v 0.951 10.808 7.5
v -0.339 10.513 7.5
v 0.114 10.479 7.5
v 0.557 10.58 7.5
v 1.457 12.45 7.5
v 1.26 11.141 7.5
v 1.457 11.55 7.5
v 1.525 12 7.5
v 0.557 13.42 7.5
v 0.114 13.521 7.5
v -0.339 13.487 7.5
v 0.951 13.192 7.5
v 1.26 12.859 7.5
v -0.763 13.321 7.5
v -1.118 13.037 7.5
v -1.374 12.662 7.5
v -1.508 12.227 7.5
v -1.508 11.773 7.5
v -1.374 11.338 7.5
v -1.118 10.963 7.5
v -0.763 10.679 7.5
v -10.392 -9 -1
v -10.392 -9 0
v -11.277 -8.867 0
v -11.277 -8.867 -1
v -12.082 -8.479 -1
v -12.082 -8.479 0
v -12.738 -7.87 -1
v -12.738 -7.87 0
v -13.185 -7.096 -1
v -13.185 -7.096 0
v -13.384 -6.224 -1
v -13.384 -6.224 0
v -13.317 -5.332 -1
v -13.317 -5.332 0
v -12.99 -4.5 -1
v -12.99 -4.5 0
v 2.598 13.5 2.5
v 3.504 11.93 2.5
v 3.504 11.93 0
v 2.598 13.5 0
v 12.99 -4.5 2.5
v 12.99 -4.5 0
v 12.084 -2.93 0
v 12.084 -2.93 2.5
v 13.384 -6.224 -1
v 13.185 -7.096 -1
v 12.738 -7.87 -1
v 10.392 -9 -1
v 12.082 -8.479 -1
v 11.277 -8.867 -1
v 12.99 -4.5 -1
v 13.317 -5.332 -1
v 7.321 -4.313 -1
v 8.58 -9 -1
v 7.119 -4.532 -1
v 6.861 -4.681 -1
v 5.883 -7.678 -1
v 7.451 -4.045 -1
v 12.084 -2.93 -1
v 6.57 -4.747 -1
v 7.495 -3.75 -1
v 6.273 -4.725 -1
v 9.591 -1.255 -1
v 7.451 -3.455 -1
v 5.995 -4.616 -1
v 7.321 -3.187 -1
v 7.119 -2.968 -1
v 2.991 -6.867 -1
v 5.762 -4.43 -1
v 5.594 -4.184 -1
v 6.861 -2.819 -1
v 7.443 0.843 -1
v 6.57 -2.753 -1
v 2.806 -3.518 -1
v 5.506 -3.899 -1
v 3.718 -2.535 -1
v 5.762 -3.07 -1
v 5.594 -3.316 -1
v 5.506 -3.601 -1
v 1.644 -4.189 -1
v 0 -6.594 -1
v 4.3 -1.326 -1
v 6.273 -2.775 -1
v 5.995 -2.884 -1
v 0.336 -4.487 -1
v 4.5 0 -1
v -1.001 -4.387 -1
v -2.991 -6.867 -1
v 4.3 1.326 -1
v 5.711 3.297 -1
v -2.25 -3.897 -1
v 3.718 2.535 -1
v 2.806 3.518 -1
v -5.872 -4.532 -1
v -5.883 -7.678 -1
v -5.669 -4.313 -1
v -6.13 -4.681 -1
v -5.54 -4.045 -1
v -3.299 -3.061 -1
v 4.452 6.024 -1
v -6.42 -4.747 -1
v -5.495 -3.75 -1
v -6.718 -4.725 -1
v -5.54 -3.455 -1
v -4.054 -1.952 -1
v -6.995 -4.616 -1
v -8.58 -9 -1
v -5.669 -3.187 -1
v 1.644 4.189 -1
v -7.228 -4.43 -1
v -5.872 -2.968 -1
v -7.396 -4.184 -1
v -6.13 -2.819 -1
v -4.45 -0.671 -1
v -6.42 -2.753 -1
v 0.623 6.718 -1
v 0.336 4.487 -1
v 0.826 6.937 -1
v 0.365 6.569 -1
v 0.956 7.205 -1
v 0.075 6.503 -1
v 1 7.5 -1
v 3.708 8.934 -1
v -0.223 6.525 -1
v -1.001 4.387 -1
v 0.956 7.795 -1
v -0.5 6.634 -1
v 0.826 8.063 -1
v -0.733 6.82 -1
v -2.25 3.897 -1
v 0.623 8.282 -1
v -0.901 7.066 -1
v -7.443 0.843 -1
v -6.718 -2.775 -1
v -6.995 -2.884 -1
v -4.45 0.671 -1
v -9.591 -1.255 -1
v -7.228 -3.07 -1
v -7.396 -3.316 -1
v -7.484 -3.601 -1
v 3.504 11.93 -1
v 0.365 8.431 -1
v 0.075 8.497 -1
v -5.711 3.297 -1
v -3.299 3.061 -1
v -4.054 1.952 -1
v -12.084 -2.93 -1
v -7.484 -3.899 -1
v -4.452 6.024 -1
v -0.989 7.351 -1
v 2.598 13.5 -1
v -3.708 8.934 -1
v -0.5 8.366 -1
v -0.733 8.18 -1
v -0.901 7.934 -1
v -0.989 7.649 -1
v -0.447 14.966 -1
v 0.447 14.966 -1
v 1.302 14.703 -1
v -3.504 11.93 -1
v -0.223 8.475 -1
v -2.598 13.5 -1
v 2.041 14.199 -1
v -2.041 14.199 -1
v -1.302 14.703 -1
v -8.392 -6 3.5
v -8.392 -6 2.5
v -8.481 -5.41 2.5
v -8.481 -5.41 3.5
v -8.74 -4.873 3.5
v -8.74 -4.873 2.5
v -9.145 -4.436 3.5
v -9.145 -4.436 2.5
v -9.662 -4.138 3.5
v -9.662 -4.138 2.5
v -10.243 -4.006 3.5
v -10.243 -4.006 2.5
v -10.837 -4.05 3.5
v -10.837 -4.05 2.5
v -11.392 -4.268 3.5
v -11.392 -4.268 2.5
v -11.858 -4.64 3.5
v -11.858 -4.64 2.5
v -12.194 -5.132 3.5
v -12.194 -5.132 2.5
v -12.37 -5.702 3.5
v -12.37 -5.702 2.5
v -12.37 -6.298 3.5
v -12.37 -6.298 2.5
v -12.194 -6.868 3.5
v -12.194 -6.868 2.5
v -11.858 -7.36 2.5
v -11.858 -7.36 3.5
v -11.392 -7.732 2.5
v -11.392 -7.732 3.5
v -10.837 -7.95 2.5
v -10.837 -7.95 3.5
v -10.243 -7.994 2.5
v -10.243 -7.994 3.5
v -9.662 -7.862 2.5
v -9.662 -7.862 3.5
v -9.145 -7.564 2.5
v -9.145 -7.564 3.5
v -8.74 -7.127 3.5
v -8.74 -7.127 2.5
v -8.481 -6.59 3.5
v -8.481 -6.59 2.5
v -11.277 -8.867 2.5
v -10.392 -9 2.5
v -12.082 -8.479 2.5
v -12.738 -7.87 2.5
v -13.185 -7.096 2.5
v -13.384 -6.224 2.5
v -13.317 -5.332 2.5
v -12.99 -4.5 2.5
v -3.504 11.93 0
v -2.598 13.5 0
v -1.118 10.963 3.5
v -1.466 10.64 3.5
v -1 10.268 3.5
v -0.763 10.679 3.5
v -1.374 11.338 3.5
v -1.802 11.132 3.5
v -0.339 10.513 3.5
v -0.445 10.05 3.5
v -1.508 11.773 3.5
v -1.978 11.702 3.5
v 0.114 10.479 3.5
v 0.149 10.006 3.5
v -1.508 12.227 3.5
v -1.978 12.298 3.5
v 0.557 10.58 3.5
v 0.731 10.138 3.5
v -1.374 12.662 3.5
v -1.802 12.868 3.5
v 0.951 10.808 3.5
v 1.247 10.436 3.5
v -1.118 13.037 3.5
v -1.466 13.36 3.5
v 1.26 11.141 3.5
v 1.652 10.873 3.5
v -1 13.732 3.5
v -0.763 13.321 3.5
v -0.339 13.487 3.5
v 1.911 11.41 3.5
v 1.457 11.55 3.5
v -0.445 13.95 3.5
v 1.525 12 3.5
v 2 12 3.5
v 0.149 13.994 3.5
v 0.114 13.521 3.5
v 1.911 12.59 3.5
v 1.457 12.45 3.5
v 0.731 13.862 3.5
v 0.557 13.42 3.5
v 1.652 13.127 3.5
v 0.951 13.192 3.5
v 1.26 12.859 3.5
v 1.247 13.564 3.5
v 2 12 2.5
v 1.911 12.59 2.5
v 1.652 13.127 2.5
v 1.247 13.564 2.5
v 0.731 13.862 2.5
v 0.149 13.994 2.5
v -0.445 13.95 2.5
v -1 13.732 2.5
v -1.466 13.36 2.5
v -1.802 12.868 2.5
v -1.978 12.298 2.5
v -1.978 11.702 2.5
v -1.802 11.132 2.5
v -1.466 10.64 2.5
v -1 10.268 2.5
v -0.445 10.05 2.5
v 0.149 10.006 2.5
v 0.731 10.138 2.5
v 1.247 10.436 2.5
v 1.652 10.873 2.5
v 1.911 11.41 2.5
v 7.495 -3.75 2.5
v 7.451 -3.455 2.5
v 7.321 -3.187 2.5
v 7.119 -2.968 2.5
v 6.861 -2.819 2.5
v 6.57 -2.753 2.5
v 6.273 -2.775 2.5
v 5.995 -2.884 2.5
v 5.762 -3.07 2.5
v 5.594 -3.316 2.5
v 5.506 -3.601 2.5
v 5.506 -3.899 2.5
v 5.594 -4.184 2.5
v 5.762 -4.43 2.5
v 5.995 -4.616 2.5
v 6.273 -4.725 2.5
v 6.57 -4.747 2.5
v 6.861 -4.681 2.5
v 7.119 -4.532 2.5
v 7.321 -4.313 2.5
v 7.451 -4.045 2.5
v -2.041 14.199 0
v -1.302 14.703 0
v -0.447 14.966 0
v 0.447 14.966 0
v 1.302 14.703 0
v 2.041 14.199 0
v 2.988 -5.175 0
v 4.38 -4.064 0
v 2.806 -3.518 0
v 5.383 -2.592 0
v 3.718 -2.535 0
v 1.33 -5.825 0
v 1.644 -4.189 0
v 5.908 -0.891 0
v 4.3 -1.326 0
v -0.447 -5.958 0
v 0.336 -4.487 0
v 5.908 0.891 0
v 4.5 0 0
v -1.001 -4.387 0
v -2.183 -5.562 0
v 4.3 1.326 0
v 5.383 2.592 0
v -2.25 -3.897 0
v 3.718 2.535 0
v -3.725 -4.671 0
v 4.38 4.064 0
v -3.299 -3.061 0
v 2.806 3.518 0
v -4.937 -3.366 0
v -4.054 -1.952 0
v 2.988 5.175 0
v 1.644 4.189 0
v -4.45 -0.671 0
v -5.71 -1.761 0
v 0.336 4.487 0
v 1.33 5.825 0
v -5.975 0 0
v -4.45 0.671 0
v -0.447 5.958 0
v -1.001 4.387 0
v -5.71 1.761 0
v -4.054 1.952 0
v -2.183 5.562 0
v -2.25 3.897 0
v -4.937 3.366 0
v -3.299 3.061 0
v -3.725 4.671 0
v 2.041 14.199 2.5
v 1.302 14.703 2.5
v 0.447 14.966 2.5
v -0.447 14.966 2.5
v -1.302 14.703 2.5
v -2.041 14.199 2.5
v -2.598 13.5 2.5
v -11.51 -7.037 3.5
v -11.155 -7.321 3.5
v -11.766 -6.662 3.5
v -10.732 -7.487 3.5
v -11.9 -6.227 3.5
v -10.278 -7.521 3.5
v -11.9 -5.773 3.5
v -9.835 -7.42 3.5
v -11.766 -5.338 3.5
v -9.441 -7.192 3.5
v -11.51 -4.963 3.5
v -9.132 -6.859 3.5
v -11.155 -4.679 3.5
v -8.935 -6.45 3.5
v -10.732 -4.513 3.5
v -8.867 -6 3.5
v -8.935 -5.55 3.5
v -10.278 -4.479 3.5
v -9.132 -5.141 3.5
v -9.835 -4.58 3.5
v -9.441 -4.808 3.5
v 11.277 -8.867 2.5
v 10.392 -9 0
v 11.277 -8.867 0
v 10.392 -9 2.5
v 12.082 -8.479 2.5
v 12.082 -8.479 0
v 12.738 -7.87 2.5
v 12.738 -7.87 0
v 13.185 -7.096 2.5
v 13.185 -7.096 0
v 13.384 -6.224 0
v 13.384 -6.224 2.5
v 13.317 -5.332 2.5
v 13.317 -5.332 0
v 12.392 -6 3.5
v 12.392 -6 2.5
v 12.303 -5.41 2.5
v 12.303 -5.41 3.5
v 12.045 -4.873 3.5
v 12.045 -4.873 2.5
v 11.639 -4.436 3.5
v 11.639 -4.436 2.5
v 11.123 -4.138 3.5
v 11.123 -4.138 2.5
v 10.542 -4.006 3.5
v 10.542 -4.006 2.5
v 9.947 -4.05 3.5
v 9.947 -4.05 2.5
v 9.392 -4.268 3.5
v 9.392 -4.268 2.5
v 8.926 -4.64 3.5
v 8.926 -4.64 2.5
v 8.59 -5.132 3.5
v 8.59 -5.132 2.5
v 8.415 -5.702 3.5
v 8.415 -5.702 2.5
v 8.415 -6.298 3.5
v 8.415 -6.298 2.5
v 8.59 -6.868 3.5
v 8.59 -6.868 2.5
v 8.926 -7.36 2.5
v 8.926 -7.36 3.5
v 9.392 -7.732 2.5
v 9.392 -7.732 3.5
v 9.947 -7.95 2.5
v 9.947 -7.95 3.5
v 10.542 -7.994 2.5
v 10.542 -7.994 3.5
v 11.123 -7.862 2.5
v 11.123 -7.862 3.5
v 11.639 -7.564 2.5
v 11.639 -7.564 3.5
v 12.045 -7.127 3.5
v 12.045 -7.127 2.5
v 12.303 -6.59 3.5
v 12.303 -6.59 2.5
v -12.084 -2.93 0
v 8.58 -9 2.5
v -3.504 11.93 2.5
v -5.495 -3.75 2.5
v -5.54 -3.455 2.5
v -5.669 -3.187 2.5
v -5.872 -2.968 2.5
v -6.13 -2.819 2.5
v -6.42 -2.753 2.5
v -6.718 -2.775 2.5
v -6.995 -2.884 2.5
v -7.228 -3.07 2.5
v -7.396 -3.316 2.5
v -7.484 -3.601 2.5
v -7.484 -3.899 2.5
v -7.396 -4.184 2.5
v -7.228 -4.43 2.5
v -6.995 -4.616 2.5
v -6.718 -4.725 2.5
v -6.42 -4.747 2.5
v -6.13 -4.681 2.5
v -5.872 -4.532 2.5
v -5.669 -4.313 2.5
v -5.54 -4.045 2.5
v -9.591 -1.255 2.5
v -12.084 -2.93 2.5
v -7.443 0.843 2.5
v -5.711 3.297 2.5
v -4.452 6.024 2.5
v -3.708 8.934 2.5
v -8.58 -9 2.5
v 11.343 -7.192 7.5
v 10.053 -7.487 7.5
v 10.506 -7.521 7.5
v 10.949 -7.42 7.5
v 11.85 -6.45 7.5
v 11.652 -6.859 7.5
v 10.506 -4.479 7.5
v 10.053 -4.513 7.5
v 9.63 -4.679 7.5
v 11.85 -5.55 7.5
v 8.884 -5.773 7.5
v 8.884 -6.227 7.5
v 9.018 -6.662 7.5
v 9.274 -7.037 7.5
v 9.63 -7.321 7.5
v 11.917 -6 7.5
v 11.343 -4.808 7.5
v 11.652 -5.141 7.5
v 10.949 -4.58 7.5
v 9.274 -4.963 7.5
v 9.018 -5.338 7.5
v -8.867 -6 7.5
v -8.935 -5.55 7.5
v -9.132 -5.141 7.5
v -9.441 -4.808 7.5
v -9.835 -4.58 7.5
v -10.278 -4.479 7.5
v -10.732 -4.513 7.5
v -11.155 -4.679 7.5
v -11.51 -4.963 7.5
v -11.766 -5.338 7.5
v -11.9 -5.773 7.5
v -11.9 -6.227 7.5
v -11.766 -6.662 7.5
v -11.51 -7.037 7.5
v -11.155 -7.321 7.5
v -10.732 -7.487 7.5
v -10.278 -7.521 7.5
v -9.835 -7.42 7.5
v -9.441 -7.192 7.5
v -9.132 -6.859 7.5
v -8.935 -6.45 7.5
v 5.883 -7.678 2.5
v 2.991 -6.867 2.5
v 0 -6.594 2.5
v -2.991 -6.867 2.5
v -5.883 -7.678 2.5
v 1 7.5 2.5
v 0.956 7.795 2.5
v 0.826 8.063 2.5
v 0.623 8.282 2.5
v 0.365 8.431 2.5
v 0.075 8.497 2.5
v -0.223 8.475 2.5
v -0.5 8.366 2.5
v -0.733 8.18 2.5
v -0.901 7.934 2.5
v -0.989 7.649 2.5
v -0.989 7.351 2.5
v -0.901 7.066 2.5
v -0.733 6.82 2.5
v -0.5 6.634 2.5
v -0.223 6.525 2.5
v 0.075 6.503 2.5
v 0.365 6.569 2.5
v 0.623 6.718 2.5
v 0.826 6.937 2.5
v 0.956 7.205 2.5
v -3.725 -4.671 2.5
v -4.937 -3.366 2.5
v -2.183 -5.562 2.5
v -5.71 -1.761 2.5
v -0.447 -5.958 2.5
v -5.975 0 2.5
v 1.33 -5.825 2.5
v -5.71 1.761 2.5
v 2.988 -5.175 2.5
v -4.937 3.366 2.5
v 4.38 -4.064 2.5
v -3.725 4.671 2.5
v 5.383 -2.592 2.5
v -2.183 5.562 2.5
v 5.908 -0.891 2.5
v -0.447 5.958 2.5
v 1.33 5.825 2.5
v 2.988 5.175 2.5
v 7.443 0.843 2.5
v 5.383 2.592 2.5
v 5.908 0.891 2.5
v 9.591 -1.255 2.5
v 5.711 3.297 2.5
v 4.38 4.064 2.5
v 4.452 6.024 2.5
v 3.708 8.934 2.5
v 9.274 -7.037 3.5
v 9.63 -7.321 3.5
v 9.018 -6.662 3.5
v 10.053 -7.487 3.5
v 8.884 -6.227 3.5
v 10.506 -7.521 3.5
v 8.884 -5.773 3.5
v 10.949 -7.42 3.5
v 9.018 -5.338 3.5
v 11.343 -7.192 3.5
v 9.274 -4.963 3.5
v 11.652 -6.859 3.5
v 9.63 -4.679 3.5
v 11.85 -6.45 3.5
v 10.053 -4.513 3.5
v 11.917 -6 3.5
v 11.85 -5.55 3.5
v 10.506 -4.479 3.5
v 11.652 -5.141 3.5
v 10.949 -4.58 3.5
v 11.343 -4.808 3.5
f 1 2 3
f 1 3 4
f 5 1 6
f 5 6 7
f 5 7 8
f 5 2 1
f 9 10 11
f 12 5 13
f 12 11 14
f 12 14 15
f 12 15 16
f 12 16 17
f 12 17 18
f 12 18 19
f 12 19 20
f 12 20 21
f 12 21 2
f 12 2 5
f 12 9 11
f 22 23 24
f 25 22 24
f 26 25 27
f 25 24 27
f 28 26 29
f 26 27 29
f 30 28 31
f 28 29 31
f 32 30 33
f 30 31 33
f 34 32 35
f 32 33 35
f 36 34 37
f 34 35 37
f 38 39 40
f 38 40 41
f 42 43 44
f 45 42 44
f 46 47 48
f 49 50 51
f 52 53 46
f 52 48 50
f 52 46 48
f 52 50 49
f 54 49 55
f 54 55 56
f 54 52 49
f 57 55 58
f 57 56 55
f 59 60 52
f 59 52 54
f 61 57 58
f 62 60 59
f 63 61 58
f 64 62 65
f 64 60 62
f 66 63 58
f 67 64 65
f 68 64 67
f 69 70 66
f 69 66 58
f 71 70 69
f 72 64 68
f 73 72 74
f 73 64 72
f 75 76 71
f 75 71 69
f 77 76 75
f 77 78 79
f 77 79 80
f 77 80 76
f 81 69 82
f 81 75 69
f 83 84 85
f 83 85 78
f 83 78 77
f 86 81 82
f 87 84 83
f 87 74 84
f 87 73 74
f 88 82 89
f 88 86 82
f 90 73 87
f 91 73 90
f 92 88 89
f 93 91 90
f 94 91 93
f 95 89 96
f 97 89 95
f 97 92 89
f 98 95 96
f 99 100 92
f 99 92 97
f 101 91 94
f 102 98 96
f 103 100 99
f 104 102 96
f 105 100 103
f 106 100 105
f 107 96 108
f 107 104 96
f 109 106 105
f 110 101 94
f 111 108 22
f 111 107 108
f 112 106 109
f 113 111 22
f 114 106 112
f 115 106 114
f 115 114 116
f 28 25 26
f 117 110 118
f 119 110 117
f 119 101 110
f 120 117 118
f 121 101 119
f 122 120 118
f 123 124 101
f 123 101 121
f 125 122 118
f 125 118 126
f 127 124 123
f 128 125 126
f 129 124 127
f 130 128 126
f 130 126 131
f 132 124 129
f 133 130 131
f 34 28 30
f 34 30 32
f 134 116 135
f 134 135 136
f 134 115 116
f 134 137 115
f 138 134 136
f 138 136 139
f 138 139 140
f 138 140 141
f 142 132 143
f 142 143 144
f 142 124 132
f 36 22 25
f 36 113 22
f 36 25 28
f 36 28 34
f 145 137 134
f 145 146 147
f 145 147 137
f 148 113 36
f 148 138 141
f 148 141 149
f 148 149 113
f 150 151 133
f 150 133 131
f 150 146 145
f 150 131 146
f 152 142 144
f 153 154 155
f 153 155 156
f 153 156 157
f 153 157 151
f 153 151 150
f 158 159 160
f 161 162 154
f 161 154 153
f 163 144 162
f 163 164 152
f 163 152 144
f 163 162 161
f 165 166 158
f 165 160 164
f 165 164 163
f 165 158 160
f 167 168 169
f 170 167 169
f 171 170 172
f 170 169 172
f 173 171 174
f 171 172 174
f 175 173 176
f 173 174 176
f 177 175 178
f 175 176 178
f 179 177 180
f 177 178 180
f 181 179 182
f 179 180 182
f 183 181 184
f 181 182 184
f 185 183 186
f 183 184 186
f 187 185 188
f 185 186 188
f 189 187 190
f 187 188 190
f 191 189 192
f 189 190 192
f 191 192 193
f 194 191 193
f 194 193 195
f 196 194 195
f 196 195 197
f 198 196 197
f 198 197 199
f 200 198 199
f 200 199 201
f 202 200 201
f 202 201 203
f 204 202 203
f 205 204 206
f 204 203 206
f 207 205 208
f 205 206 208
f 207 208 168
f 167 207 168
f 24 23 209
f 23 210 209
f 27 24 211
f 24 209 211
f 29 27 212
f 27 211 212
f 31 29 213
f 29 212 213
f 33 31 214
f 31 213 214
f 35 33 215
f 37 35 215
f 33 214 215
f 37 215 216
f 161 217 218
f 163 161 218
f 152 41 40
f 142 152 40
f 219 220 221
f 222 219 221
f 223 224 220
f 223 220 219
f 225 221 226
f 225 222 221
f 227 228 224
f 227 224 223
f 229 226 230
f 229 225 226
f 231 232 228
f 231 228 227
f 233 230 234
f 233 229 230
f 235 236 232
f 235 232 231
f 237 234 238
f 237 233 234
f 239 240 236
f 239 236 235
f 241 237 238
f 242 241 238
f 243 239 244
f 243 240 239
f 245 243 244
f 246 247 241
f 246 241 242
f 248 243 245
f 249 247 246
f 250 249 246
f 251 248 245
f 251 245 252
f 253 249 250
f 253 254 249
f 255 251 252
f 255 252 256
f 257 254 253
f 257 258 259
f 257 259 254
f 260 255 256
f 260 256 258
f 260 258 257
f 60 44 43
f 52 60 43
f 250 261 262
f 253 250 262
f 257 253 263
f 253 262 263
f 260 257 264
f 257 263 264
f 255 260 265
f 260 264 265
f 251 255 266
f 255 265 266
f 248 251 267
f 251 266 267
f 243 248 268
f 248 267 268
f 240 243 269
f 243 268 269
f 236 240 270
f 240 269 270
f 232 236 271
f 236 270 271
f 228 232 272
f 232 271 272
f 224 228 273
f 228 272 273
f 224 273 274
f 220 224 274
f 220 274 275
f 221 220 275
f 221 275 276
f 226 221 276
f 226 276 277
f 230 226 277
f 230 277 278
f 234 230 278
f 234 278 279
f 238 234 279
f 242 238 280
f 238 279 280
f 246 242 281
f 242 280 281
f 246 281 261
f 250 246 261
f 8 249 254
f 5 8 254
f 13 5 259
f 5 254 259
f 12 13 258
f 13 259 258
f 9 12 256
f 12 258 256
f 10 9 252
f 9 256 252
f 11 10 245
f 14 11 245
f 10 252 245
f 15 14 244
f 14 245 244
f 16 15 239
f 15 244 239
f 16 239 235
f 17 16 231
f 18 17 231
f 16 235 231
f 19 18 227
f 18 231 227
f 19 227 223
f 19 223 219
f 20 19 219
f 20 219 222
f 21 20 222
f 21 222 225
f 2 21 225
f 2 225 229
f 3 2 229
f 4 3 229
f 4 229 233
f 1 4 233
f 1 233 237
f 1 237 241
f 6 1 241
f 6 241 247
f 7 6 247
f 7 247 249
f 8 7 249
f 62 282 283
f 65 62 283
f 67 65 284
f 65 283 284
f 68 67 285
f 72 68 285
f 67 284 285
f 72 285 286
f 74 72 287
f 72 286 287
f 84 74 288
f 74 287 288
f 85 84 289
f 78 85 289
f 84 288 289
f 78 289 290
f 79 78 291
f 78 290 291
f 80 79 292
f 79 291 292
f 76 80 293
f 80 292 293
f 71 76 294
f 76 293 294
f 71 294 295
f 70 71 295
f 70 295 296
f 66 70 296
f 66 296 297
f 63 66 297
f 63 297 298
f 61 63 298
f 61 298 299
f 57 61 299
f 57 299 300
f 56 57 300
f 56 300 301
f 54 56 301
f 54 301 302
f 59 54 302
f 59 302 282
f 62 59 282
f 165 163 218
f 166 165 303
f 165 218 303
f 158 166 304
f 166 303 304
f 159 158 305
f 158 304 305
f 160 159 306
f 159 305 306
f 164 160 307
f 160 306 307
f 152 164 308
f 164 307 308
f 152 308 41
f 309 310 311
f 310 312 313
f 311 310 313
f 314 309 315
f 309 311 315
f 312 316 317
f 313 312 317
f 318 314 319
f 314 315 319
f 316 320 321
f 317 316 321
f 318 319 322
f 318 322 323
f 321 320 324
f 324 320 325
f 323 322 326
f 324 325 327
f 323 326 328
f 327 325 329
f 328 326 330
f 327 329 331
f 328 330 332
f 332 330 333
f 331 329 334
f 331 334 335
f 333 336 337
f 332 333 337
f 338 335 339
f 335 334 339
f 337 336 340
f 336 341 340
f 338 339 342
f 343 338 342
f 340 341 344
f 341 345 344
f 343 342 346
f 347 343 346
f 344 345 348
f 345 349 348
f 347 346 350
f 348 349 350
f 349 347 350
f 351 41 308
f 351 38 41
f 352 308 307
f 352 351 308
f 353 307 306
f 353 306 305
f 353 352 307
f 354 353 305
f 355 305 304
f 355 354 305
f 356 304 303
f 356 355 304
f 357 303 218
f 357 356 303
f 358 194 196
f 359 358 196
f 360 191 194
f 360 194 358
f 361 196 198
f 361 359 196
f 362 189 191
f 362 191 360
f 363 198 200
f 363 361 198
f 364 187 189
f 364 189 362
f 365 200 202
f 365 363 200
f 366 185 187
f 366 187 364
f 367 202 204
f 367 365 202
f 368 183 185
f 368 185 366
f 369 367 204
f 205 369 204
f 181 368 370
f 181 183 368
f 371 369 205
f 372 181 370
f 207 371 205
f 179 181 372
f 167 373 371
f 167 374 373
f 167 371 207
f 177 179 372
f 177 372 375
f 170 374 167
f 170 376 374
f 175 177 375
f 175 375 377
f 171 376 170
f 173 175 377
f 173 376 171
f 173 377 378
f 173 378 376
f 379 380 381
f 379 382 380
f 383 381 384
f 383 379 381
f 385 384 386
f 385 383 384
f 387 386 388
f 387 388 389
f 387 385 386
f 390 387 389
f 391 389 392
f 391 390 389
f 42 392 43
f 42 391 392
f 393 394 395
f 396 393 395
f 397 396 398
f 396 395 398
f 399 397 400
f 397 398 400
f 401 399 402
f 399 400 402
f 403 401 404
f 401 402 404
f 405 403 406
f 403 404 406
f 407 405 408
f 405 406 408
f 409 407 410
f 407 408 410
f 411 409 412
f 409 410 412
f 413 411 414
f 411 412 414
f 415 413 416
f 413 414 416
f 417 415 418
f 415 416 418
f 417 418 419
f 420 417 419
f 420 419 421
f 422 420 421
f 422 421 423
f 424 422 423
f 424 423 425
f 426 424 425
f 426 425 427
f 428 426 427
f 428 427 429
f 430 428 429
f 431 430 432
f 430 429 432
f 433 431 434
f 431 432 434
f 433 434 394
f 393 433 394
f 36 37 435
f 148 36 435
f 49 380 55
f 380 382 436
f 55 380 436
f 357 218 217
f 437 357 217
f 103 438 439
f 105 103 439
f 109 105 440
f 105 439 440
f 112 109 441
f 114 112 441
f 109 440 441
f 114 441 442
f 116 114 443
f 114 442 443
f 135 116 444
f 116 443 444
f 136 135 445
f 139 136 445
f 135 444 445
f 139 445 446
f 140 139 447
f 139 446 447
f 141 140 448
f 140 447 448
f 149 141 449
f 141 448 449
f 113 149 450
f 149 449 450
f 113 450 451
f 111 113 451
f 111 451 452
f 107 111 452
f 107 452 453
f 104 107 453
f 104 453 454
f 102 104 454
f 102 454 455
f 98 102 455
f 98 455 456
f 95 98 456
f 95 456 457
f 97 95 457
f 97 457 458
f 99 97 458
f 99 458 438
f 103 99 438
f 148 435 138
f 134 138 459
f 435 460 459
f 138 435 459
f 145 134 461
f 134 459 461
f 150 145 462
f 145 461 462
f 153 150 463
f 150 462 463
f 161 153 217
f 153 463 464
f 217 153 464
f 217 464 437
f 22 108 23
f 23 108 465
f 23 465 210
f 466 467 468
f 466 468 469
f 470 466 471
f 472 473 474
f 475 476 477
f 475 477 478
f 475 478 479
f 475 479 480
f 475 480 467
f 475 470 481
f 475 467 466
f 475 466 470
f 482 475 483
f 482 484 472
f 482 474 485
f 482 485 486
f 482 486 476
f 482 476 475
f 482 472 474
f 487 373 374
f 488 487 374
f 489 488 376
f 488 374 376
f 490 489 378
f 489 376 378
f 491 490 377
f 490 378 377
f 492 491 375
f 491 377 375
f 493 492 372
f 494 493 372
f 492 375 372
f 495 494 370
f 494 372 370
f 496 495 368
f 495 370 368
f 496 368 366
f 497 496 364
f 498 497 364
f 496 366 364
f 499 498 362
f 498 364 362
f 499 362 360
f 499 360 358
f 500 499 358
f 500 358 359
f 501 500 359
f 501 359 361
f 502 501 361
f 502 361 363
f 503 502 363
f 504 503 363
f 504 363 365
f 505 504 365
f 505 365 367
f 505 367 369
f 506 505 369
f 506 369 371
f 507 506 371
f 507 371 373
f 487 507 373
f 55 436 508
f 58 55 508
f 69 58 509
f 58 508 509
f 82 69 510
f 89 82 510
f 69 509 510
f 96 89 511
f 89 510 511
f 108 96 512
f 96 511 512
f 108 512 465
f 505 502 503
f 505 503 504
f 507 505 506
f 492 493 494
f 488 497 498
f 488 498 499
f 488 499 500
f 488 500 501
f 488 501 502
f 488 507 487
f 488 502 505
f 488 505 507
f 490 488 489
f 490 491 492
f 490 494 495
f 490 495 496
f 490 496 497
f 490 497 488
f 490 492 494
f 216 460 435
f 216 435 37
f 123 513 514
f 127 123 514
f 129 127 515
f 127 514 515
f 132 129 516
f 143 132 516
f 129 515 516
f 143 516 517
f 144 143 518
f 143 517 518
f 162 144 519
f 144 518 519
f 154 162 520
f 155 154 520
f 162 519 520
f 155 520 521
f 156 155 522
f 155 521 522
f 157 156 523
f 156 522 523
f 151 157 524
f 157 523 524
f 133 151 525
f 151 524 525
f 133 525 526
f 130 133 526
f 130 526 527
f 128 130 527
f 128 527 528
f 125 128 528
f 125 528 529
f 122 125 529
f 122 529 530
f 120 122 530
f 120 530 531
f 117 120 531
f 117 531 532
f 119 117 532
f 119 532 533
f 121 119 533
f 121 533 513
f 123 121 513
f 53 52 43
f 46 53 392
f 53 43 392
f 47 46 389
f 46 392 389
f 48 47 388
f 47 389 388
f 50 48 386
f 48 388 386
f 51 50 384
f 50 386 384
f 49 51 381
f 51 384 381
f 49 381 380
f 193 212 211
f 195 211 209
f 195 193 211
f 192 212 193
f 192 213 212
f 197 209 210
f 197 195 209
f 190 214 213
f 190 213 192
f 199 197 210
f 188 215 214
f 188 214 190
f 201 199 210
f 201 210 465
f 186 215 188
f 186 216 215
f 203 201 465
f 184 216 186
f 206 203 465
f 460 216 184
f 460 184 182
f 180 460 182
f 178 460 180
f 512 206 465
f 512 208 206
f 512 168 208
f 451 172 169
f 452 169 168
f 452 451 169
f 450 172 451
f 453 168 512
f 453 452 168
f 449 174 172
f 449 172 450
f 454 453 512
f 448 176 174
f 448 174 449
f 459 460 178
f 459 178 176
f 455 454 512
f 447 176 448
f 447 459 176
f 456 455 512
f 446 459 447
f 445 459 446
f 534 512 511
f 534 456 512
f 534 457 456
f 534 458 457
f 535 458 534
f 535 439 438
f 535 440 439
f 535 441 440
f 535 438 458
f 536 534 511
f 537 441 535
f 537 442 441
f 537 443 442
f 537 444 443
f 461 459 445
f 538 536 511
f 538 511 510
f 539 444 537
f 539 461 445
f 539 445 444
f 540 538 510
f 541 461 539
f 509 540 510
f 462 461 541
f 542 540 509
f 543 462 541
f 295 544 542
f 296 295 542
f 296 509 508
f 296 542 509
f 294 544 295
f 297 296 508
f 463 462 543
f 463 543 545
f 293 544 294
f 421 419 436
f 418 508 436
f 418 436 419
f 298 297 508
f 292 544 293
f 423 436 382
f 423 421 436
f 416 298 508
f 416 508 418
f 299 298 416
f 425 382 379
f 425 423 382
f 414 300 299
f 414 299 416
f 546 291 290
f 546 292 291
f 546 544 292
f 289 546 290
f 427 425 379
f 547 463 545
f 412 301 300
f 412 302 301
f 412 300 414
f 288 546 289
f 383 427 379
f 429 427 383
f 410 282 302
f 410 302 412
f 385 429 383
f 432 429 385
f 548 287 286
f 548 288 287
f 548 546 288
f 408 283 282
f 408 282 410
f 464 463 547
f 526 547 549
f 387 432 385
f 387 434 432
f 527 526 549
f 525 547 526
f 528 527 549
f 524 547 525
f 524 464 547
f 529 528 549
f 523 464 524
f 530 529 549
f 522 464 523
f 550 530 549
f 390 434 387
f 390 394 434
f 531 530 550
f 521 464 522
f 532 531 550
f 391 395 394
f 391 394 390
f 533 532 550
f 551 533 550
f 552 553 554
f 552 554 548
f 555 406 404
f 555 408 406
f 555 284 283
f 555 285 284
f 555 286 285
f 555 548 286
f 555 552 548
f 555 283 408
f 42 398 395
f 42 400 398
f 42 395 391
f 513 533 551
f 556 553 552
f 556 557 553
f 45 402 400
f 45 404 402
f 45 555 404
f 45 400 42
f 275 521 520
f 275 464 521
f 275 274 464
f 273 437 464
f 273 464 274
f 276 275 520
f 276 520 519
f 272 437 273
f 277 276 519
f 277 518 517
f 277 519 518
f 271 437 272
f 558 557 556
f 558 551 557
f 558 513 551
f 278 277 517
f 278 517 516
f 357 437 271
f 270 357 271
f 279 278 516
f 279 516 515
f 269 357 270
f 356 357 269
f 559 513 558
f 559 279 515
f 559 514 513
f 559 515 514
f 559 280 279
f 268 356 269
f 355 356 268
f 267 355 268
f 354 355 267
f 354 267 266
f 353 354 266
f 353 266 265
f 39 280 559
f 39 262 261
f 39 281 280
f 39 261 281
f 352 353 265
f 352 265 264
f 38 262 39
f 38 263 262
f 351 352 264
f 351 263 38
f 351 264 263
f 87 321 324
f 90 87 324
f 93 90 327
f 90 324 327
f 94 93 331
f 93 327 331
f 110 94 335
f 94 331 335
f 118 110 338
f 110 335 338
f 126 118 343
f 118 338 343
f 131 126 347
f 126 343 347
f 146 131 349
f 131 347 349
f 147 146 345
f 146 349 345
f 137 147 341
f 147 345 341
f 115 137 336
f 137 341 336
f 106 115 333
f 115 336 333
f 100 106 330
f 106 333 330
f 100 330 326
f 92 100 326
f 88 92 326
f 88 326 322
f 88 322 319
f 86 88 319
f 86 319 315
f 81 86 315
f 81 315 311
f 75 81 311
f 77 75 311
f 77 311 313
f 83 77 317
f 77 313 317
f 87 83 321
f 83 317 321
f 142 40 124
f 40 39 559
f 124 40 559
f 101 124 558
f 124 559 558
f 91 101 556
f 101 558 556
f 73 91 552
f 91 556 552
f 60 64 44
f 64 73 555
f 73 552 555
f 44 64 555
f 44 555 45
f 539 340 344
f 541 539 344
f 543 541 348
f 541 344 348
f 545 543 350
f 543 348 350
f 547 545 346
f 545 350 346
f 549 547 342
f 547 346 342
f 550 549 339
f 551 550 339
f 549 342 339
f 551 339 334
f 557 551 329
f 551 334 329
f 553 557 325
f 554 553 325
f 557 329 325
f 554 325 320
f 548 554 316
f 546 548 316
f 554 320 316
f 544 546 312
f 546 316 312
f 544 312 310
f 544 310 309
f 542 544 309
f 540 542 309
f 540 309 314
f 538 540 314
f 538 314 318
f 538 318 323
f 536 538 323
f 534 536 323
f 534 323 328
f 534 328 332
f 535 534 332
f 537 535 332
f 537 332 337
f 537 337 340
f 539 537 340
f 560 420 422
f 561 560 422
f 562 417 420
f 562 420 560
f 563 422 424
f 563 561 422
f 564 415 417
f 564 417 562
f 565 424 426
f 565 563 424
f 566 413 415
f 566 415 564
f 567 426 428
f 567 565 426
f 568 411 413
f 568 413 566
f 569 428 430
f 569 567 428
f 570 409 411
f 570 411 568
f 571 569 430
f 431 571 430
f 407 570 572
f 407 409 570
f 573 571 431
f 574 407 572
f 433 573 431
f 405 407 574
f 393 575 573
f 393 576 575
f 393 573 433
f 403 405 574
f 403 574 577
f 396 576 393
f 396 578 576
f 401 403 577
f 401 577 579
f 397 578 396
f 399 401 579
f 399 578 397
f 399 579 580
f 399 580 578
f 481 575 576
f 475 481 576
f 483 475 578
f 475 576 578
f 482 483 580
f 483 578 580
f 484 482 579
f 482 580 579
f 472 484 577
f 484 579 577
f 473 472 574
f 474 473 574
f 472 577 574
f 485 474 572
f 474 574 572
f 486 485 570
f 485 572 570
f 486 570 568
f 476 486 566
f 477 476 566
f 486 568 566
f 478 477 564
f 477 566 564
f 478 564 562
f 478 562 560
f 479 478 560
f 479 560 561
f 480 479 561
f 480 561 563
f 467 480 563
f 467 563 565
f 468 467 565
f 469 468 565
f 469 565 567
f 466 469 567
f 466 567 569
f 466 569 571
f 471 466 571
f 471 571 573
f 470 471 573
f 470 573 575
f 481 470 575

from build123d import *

# Parameters (mm, degrees)
EXTRUDE_1_DEPTH     = 2.5
FILLET_1_R          = 3
SKETCH_2_R          = 1.525
EXTRUDE_2_DEPTH     = 5
SKETCH_3_R          = 2
EXTRUDE_3_DEPTH     = 1
SKETCH_4_R          = 5.975
CUT_EXTRUDE_1_DEPTH = 10
EXTRUDE_4_DEPTH     = 1
SKETCH_6_R          = 4.5
CUT_EXTRUDE_2_DEPTH = 1
SKETCH_7_R          = 1
CUT_EXTRUDE_3_DEPTH = 10
SKETCH_9_R          = 16.5
CUT_EXTRUDE_4_DEPTH = 10


with BuildPart() as part:
    # 草图1 → 凸台-拉伸1 (new body)
    with BuildSketch(Plane.XY):
        Polygon((-15.588457268, -9), (15.588457268, -9), (0, 18), align=None)
        Polygon((10.392304845, -6), (0, 12), (-10.392304845, -6), align=None, mode=Mode.SUBTRACT)
        Polygon((-10.392304845, -6), (10.392304845, -6), (0, 12), align=None)
    extrude(amount=EXTRUDE_1_DEPTH)

    # 圆角1
    fillet_1_edges = [part.edges().sort_by_distance(p)[0] for p in [
        (-15.588457268, -9, 1.25),
        (0, 18, 1.25),
        (15.588457268, -9, 1.25),
    ]]
    fillet(fillet_1_edges, radius=FILLET_1_R)

    # 草图2 → 凸台-拉伸2 (add)
    with BuildSketch(Plane.XY.offset(2.5)):
        with Locations((0, 12)):
            Circle(SKETCH_2_R)
        with Locations((10.392304845, -6)):
            Circle(SKETCH_2_R)
        with Locations((-10.392304845, -6)):
            Circle(SKETCH_2_R)
    extrude(amount=EXTRUDE_2_DEPTH)

    # 草图3 → 凸台-拉伸3 (add)
    with BuildSketch(Plane.XY.offset(2.5)):
        with Locations((0, 12)):
            Circle(SKETCH_3_R)
        with Locations((10.392304845, -6)):
            Circle(SKETCH_3_R)
        with Locations((-10.392304845, -6)):
            Circle(SKETCH_3_R)
    extrude(amount=EXTRUDE_3_DEPTH)

    # 草图4 → 切除-拉伸1 (cut)
    with BuildSketch(Plane(origin=(0, 0, 0), x_dir=(-1, 0, 0), z_dir=(0, 0, -1))):
        Circle(SKETCH_4_R)
    extrude(amount=-CUT_EXTRUDE_1_DEPTH, mode=Mode.SUBTRACT)

    # 草图5 → 凸台-拉伸4 (add)
    with BuildSketch(Plane(origin=(0, 0, 0), x_dir=(-1, 0, 0), z_dir=(0, 0, -1))):
        with BuildLine():
            Line((-10.392304845, -9), (10.392304845, -9))
            ThreePointArc((10.392304845, -9), (12.990381057, -7.5), (12.990381057, -4.5))
            Line((12.990381057, -4.5), (2.598076211, 13.5))
            ThreePointArc((2.598076211, 13.5), (0, 15), (-2.598076211, 13.5))
            Line((-2.598076211, 13.5), (-12.990381057, -4.5))
            ThreePointArc((-12.990381057, -4.5), (-12.990381057, -7.5), (-10.392304845, -9))
        make_face()
    extrude(amount=EXTRUDE_4_DEPTH)

    # 草图6 → 切除-拉伸2 (cut)
    with BuildSketch(Plane.XY):
        Circle(SKETCH_6_R)
    extrude(amount=-CUT_EXTRUDE_2_DEPTH, mode=Mode.SUBTRACT)

    # 草图7 → 切除-拉伸3 (cut)
    with BuildSketch(Plane.XY.offset(2.5)):
        with Locations((0, 7.5)):
            Circle(SKETCH_7_R)
        with Locations((6.495190528, -3.75)):
            Circle(SKETCH_7_R)
        with Locations((-6.495190528, -3.75)):
            Circle(SKETCH_7_R)
    extrude(amount=-CUT_EXTRUDE_3_DEPTH, mode=Mode.SUBTRACT)

    # 草图9 → 切除-拉伸4 (cut)
    with BuildSketch(Plane.XY.offset(2.5)):
        with Locations((-20, 11.547005384)):
            Circle(SKETCH_9_R)
        with Locations((20, 11.547005384)):
            Circle(SKETCH_9_R)
        with Locations((0, -23.094010768)):
            Circle(SKETCH_9_R)
    extrude(amount=-CUT_EXTRUDE_4_DEPTH, mode=Mode.SUBTRACT)


solid = part.part
